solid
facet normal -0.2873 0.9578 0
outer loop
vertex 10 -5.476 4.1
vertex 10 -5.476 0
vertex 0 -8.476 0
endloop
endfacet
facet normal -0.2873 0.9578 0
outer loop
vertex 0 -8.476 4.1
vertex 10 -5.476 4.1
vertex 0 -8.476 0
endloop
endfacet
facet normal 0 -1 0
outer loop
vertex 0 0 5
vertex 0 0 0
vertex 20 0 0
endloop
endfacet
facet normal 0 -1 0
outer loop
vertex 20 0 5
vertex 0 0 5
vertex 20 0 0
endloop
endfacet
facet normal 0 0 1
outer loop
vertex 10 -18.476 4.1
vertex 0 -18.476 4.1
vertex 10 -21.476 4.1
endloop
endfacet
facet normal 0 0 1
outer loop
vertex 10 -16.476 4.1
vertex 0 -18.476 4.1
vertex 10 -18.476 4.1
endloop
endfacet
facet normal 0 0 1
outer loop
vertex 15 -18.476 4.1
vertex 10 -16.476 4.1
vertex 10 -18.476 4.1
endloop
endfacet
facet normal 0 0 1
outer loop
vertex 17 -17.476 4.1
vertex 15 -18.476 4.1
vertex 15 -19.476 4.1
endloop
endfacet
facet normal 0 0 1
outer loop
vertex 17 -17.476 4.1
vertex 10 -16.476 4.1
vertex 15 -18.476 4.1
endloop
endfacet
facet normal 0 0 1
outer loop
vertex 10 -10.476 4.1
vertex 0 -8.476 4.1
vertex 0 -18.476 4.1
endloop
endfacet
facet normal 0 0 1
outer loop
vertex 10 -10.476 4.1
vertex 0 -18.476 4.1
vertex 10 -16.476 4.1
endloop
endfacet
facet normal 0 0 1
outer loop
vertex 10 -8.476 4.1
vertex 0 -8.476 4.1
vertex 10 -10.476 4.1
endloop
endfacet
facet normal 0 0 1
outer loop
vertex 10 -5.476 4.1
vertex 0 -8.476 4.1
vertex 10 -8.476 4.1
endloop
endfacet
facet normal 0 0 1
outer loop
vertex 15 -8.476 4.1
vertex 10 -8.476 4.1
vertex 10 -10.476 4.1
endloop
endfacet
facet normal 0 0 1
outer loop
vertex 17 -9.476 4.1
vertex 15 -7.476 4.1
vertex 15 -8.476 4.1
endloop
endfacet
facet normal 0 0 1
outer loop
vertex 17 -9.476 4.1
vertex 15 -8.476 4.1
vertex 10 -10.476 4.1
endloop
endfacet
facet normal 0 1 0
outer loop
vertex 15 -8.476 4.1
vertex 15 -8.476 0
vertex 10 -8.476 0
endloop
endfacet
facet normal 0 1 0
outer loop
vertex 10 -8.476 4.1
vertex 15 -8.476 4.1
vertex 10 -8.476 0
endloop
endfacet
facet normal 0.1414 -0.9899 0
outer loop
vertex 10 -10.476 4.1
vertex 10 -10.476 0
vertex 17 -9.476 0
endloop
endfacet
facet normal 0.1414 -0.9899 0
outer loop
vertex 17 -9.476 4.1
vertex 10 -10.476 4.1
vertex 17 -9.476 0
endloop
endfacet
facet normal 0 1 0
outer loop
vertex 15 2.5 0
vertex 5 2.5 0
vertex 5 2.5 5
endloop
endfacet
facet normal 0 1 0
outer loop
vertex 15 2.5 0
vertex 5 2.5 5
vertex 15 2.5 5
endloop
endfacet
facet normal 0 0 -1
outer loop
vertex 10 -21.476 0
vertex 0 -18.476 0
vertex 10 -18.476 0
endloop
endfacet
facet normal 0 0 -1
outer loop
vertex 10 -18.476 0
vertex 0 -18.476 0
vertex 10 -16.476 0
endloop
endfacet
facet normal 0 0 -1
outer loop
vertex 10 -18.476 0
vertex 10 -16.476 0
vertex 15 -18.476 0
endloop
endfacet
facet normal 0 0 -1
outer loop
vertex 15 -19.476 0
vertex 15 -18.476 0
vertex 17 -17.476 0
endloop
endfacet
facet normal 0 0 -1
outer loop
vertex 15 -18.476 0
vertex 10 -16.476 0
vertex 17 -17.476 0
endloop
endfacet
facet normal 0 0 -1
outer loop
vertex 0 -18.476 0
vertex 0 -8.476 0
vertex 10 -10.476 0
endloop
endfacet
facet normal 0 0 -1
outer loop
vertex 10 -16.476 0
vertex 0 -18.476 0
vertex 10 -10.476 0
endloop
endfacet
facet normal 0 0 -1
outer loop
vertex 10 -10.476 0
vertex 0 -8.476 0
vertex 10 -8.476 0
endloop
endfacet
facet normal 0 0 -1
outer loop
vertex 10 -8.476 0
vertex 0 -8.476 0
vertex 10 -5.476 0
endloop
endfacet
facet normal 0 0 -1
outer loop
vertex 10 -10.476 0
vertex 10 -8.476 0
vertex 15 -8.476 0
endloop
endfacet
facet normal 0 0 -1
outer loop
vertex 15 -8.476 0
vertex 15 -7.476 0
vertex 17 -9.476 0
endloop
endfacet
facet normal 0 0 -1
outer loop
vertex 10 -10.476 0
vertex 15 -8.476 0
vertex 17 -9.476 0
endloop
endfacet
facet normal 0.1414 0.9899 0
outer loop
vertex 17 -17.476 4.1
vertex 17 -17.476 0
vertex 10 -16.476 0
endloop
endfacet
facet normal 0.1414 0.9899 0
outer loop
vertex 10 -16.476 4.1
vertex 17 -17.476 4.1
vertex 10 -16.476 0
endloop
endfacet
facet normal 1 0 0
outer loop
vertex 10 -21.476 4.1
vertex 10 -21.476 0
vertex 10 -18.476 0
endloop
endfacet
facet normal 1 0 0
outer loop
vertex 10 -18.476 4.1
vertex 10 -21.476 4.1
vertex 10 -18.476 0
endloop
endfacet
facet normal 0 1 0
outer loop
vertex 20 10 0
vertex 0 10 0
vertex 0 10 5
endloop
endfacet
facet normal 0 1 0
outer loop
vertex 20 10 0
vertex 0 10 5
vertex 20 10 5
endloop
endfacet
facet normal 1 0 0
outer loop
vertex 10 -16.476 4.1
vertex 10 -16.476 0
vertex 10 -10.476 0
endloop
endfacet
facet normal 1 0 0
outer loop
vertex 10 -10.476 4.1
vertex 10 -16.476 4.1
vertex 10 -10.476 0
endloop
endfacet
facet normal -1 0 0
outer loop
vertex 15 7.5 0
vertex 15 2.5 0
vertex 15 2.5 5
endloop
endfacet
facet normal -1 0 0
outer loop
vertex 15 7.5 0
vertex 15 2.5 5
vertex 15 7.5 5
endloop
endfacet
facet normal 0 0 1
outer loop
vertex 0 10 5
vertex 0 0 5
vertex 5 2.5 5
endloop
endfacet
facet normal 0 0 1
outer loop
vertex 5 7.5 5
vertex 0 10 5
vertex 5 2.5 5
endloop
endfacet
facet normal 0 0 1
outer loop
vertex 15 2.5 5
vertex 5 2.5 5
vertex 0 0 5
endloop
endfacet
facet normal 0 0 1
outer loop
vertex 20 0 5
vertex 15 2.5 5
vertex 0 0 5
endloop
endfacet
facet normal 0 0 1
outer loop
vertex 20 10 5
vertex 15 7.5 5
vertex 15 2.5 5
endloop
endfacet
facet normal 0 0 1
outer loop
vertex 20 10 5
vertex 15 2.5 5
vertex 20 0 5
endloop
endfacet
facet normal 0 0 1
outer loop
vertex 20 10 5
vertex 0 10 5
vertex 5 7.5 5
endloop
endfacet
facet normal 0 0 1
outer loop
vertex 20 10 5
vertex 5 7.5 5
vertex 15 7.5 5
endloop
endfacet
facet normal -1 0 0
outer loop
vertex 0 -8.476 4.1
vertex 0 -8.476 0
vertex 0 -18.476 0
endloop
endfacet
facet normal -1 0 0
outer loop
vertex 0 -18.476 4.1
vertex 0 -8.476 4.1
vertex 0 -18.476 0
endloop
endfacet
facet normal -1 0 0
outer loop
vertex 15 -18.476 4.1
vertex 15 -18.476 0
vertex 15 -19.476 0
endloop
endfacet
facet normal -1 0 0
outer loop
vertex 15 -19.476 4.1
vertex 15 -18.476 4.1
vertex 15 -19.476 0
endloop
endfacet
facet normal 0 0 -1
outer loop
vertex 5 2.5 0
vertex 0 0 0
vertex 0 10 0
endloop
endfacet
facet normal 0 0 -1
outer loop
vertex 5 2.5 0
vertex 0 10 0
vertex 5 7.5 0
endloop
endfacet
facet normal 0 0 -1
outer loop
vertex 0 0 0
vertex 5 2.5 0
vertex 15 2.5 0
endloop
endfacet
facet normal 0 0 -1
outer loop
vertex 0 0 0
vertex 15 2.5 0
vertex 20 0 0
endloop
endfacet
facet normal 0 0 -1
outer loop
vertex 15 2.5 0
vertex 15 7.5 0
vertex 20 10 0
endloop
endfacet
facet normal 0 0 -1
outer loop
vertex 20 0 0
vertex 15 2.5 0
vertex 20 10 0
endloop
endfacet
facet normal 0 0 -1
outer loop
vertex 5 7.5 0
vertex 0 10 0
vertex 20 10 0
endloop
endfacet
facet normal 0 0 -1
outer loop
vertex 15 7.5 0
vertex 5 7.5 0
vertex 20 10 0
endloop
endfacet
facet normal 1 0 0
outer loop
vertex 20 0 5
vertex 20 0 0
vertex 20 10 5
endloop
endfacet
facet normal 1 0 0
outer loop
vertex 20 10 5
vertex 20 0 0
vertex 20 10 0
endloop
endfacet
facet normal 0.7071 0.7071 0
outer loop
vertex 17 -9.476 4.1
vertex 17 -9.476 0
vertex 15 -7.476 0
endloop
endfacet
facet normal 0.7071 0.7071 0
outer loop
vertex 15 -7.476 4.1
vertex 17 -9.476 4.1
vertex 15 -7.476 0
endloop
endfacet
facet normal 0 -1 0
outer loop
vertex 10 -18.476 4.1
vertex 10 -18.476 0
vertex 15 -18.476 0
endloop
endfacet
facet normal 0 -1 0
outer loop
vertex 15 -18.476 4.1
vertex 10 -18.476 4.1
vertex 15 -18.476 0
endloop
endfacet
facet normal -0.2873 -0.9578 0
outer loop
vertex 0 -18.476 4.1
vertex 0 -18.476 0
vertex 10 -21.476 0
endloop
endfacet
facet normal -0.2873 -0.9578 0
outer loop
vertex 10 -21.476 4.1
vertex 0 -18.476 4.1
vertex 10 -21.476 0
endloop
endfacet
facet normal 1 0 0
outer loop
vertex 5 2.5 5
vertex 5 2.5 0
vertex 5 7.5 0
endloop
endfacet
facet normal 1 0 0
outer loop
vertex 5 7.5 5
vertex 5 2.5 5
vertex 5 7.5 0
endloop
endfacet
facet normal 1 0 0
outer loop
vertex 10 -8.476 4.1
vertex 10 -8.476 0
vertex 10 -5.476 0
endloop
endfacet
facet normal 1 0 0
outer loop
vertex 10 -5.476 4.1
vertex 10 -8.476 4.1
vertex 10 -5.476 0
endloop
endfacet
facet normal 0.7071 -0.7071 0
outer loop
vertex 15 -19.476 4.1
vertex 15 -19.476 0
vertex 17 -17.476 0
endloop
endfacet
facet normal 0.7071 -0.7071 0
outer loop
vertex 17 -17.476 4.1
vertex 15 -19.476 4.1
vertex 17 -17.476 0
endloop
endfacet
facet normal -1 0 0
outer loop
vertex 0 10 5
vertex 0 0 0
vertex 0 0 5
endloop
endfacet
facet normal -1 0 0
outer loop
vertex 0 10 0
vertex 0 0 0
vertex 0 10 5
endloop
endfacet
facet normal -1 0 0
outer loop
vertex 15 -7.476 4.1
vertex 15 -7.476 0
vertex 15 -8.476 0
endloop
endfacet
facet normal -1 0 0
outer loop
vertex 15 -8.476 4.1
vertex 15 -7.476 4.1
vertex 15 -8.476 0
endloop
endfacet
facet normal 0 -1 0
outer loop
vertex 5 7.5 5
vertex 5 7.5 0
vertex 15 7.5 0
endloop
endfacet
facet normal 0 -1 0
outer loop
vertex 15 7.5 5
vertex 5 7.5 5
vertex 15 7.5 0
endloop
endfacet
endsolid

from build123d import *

# Parameters (mm, degrees)
F0_W     = 20
F0_H     = 10.000001
F2_DEPTH = 5
F1_W     = 10
F1_H     = 5
F3_DEPTH = 5.001
F5_DEPTH = 4.1


with BuildPart() as f2:
    # F0 (on Top) → F2 (new body)
    with BuildSketch(Plane.XY):
        with Locations((10, 5)):
            Rectangle(F0_W, F0_H)
    extrude(amount=F2_DEPTH)

    # F1 (on face) → F3 (cut, through all)
    with BuildSketch(Plane.XY):
        with Locations((10, 5.000001)):
            Rectangle(F1_W, F1_H)
    extrude(amount=F3_DEPTH, mode=Mode.SUBTRACT)


with BuildPart() as f5:
    # F4 (on Top) → F5 (new body)
    with BuildSketch(Plane.XY):
        Polygon((15, -7.475967), (15, -8.475967), (10, -8.475967), (10, -5.475967), (0, -8.475967), (0, -18.475967), (10, -21.475967), (10, -18.475967), (15, -18.475967), (15, -19.475967), (17, -17.475967), (10, -16.475967), (10, -10.475967), (17, -9.475967), align=None)
    extrude(amount=F5_DEPTH)


solid = Compound([f2.part, f5.part])
